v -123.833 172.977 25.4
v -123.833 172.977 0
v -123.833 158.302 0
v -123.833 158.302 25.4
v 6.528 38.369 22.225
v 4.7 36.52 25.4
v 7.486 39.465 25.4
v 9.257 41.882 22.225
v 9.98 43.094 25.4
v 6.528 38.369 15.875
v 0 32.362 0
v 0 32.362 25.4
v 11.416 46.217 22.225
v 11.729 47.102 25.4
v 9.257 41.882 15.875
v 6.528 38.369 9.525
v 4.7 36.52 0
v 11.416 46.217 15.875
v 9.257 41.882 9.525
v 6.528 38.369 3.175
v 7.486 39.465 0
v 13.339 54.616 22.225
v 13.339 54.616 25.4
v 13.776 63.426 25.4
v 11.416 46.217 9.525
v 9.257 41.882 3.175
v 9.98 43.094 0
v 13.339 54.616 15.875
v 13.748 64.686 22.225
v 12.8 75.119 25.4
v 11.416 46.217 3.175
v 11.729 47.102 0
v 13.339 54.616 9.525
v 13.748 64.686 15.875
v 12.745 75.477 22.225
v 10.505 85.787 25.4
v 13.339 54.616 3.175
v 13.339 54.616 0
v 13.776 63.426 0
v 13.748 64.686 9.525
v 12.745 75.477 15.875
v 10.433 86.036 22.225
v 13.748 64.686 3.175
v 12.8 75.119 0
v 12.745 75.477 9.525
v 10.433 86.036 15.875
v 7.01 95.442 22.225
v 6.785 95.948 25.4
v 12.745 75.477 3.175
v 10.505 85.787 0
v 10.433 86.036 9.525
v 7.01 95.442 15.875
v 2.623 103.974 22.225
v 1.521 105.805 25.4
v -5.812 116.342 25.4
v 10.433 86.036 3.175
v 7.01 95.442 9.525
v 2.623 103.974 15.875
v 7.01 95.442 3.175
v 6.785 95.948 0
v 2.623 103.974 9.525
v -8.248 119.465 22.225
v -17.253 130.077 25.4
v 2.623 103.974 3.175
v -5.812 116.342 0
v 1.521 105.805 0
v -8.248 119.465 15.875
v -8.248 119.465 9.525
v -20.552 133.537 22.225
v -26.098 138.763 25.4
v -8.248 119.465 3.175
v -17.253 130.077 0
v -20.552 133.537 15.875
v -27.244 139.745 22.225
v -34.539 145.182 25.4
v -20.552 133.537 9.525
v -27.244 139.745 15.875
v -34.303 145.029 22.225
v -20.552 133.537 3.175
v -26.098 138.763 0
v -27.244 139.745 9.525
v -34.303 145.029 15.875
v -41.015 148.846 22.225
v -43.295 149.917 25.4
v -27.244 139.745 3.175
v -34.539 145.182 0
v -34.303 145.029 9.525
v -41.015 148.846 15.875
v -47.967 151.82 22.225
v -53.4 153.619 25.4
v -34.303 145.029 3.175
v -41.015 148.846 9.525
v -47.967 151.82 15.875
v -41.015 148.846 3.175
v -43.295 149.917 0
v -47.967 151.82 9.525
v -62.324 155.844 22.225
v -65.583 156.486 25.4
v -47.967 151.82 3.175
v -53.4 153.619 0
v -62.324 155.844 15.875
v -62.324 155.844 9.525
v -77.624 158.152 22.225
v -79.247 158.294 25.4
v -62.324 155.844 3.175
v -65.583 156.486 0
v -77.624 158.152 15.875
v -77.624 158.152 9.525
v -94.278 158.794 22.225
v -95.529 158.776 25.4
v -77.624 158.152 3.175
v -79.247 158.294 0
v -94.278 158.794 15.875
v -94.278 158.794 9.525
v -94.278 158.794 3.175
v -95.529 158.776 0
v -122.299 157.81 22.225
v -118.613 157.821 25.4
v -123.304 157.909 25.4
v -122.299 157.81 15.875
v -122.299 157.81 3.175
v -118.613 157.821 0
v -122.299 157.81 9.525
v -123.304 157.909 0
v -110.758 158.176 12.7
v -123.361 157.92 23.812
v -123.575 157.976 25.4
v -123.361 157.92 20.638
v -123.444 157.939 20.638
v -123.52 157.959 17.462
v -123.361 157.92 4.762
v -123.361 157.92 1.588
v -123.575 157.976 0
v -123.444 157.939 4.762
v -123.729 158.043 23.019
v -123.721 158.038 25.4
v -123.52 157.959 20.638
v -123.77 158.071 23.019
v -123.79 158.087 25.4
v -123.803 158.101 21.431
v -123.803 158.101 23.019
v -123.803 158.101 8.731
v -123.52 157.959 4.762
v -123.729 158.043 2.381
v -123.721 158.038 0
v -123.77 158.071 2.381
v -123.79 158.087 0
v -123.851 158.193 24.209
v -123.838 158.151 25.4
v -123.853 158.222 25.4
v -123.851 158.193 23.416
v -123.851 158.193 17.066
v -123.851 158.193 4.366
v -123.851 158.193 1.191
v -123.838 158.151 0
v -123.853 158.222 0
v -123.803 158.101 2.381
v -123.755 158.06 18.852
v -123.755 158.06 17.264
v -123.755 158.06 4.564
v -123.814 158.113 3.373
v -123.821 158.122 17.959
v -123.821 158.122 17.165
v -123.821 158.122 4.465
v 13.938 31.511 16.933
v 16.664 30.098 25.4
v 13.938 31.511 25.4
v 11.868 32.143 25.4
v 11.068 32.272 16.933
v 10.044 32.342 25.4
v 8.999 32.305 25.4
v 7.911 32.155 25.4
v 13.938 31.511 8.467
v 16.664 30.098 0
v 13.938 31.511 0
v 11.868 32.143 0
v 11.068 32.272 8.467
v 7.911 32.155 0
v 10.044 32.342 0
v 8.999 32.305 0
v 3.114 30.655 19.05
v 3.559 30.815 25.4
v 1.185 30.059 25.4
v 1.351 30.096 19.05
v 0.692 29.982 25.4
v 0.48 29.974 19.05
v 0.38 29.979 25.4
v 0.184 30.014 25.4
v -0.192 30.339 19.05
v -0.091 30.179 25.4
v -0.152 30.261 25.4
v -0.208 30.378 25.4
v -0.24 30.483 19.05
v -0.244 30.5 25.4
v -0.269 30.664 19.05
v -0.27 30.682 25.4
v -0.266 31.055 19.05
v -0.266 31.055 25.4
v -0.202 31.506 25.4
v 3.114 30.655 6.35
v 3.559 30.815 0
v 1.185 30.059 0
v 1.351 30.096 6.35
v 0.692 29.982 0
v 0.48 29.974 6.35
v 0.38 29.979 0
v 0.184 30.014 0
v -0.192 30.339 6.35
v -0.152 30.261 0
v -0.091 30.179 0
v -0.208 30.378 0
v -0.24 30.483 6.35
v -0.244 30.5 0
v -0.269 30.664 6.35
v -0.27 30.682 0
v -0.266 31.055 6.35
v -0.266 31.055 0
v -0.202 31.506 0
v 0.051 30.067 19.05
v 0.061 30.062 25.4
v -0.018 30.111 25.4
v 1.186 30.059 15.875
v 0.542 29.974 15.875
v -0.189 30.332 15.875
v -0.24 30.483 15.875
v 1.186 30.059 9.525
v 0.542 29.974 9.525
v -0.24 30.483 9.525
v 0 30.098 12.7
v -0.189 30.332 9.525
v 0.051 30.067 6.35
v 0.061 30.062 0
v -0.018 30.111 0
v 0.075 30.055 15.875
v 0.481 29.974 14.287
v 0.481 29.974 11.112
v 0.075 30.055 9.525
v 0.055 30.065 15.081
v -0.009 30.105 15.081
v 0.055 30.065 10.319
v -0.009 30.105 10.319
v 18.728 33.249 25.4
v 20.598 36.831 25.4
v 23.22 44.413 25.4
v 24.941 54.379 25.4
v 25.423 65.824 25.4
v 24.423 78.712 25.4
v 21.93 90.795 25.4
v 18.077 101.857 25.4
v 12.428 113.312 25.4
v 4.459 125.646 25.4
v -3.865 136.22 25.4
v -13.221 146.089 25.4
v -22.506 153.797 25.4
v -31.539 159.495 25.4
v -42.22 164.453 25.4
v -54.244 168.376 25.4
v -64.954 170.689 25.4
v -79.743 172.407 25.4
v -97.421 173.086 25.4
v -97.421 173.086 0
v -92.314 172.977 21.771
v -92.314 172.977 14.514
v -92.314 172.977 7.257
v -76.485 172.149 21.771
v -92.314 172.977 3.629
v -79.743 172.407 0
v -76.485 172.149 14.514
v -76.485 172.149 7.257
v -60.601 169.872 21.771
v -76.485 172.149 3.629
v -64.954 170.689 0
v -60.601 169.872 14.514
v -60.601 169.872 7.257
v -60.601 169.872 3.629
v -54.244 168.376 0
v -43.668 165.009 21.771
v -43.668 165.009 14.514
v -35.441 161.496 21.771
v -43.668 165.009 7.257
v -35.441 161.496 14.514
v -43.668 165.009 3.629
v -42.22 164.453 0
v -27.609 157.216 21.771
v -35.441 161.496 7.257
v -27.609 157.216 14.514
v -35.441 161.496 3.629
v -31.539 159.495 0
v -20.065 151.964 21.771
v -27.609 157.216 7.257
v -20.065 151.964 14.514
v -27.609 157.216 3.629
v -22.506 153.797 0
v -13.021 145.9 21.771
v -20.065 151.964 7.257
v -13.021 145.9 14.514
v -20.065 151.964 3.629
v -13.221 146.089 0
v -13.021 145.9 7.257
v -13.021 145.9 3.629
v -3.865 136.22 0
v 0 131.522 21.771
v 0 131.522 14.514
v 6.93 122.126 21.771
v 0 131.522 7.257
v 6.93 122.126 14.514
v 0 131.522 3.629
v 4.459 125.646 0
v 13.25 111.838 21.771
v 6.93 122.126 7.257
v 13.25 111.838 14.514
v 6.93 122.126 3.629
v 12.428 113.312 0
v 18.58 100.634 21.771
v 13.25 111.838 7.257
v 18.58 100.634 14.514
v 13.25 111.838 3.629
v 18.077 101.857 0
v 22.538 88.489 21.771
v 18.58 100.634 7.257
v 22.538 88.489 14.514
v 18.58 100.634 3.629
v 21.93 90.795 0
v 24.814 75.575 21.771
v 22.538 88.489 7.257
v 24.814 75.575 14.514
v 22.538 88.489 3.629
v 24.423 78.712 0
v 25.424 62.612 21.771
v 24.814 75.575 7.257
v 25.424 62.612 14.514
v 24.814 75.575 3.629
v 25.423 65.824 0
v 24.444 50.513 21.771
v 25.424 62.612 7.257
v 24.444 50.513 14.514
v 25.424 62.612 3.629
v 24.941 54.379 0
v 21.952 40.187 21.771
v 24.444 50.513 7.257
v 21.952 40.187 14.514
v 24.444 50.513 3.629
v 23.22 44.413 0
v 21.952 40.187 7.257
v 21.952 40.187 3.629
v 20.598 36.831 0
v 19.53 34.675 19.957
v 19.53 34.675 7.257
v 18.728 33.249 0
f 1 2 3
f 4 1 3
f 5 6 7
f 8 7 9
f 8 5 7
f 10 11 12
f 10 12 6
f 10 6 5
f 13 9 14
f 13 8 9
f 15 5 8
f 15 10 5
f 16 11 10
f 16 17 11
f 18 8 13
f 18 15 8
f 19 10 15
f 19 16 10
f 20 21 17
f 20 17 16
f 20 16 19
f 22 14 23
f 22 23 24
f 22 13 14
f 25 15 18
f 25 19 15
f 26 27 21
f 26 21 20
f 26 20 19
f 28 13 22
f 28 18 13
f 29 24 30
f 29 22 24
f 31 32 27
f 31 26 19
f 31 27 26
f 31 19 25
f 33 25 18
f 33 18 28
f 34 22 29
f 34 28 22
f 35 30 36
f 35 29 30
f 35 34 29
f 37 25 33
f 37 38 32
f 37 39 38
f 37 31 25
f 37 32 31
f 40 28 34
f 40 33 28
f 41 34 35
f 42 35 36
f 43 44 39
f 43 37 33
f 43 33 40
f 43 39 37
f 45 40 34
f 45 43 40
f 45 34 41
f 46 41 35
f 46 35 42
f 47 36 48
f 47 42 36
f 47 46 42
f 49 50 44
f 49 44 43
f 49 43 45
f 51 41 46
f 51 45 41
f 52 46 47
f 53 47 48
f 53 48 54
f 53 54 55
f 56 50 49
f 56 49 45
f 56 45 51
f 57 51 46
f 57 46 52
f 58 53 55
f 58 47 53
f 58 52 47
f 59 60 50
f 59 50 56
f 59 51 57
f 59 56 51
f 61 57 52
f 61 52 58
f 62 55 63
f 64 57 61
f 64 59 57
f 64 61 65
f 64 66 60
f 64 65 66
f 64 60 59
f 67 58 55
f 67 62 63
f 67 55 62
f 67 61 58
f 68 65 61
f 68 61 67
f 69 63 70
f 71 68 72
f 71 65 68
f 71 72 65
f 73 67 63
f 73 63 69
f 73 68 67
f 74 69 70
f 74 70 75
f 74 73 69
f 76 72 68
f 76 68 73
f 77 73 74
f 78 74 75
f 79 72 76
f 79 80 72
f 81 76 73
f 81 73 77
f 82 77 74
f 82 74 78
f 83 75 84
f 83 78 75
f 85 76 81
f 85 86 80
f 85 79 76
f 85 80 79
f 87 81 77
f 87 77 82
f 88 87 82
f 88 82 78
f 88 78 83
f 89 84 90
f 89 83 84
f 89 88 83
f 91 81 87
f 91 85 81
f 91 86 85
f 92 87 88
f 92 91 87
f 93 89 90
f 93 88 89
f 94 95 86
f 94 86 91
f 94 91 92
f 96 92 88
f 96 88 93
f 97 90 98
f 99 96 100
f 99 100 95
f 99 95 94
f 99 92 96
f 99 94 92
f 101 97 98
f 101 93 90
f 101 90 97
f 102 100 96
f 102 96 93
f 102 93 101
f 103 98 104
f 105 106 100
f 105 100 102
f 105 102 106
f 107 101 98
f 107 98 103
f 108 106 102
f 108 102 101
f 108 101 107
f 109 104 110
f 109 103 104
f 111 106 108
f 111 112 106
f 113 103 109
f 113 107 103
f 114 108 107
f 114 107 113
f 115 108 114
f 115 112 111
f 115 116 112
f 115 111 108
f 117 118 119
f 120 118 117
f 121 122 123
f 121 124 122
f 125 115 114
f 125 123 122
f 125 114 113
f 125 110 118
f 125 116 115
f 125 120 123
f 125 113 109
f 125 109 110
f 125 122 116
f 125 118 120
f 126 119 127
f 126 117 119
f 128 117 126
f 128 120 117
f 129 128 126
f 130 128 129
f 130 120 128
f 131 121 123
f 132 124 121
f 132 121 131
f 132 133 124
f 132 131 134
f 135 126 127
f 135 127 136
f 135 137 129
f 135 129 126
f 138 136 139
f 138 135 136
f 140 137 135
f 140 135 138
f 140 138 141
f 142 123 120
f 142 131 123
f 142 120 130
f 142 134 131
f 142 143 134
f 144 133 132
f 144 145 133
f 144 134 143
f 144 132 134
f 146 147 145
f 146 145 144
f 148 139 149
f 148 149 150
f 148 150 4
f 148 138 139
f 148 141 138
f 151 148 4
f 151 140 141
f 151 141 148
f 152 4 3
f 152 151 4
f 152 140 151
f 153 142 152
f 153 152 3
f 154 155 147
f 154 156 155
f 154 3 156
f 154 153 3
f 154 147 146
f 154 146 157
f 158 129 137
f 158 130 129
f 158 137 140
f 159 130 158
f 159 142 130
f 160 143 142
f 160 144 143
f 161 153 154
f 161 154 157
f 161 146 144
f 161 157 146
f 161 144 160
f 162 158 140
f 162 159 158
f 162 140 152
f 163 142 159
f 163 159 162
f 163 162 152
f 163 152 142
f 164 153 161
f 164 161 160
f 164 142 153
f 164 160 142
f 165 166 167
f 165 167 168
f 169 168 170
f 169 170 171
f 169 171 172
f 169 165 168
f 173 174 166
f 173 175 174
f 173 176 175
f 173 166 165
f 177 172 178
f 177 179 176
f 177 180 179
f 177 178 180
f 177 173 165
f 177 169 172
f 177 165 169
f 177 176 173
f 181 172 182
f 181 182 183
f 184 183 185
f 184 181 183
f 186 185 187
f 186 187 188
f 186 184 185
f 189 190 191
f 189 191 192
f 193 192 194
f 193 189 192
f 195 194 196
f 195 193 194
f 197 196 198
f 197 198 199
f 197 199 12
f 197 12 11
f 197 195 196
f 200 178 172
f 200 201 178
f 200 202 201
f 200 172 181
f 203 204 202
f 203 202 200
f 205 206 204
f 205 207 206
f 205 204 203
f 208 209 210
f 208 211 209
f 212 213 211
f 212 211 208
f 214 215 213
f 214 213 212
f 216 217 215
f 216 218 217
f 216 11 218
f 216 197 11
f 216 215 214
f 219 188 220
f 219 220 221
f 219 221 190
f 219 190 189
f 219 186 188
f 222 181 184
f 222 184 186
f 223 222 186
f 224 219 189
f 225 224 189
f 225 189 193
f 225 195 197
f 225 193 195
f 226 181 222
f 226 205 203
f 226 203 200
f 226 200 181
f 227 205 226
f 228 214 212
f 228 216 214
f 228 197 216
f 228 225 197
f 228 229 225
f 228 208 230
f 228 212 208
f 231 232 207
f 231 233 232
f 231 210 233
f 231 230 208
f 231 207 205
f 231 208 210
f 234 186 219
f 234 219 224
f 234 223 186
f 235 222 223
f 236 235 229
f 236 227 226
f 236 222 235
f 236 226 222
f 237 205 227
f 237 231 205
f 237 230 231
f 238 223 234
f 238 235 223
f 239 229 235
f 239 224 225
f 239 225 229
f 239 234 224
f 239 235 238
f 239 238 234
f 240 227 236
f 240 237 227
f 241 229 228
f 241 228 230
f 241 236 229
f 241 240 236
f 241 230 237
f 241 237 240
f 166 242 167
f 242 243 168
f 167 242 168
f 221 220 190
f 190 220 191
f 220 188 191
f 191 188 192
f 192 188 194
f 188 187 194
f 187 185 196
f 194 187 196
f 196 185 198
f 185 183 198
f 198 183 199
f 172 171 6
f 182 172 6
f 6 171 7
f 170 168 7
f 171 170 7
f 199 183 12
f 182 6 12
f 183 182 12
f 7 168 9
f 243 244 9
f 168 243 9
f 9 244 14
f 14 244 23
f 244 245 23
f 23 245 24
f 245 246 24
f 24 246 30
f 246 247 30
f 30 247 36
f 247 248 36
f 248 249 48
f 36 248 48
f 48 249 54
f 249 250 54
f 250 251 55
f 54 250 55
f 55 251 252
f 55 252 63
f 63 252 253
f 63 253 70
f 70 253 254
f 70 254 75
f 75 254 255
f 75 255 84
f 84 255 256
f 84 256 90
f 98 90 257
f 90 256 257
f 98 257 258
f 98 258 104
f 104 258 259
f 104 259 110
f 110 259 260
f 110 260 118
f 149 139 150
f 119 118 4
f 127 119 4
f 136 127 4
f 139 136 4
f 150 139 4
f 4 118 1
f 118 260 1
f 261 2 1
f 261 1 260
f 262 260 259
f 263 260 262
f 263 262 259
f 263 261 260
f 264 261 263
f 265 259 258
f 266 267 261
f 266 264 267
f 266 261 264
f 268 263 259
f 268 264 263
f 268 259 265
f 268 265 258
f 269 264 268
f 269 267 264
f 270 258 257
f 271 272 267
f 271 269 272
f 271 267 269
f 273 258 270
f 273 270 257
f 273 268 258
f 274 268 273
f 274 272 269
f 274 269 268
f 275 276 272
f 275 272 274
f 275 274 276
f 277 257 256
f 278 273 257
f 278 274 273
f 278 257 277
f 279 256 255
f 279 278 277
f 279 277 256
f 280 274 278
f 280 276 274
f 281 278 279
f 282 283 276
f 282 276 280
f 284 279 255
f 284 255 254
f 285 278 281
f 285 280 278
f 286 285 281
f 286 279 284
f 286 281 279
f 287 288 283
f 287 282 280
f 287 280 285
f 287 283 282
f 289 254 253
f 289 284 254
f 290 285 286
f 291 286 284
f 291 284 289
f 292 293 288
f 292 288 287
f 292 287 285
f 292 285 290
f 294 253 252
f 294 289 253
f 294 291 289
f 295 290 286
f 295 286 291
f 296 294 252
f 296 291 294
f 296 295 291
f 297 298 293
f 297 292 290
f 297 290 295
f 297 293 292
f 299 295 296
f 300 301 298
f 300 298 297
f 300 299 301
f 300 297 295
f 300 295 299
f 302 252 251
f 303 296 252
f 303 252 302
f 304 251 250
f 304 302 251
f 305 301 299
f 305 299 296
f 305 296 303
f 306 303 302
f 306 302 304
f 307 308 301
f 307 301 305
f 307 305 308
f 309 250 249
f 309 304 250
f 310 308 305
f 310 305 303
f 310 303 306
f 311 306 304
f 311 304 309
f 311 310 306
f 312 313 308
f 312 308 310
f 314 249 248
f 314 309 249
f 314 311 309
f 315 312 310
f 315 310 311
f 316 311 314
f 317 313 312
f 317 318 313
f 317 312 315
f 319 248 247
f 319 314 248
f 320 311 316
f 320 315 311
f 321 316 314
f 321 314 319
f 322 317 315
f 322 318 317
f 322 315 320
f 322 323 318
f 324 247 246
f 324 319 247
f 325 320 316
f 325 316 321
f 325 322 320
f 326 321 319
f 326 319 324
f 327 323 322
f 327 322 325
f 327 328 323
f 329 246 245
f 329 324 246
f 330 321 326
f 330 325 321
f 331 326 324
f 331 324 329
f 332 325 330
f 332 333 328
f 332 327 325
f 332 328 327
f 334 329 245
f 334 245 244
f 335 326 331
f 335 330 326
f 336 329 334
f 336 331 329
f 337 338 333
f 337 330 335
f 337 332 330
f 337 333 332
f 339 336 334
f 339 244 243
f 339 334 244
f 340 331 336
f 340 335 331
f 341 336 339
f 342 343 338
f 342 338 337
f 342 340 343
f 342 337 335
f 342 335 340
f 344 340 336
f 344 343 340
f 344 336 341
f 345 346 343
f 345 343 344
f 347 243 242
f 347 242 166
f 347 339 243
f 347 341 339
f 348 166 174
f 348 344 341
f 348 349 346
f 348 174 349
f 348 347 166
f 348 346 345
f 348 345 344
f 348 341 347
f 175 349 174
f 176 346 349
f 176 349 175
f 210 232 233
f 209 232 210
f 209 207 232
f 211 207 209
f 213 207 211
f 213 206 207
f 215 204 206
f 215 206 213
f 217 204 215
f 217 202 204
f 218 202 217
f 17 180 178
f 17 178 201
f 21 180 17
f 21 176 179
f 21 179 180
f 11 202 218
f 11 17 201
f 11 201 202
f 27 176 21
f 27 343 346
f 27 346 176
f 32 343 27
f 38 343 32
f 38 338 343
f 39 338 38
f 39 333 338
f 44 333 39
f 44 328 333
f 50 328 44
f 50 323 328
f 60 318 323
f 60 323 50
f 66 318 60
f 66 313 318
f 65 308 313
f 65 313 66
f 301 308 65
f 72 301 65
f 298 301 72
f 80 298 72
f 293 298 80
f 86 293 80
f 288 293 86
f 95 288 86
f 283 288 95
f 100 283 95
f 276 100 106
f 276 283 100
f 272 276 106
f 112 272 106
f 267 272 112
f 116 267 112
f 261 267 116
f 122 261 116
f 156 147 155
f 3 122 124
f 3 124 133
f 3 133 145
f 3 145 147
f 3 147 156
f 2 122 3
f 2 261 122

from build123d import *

# Parameters (mm, degrees)
F1_DEPTH = 25.4


with BuildPart() as f1:
    # F0 (on Top) → F1 (new body)
    with BuildSketch(Plane.XY):
        with BuildLine():
            add(Edge.make_bspline(
                [(0, 32.3620848358), (4.616245299, 36.3944720125), (15.4983274834, 44.6984201373), (13.6666682436, 88.8627259497), (-7.097495706, 119.4566531382), (-32.5079925777, 147.3610034027), (-62.5358454037, 156.9909503606), (-91.9306865929, 159.8354501402), (-120.8391481347, 157.3326324801), (-123.9743855546, 157.9896672991), (-123.8329410553, 158.3019942045)],
                knots=[0, 0, 0, 0, 0.1046496121, 0.2605304968, 0.4133735293, 0.5625949593, 0.6979575673, 0.8378718565, 0.9686560343, 1, 1, 1, 1], degree=3))
            add(Edge.make_bspline(
                [(7.9113617539, 32.1550443769), (4.7203534146, 31.5526155318), (-1.0409519817, 28.3342911106), (-0.2116711823, 31.5519841263), (0, 32.3620848358)],
                knots=[0.4072781194, 0.4072781194, 0.4072781194, 0.4072781194, 0.7956278657, 1, 1, 1, 1], degree=3))
            add(Edge.make_bspline(
                [(16.6635511817, 30.0982165935), (16.7030308183, 30.2622075198), (17.0150531463, 32.7150187131), (10.8724841867, 35.4521642858), (8.5677795334, 33.1385749466), (7.9113617539, 32.1550443769)],
                knots=[0.3546609767, 0.3546609767, 0.3546609767, 0.3546609767, 0.3617589695, 0.4623198499, 0.5097820379, 0.5097820379, 0.5097820379, 0.5097820379], degree=3))
            add(Edge.make_bspline(
                [(-123.8329410553, 172.9773198607), (-113.6918879881, 173.1962776362), (-92.015737529, 173.3126790169), (-60.3657998712, 171.4315667112), (-25.7083616084, 159.2218478032), (1.6611720718, 132.14191491), (27.1899010949, 91.1007415152), (26.0918092721, 45.9492515021), (18.6801450725, 32.8924904799), (16.6635511817, 30.0982165935)],
                knots=[0, 0, 0, 0, 0.1342724804, 0.2692810288, 0.4114531234, 0.5583310233, 0.72502551, 0.8912530752, 0.9464123607, 0.9464123607, 0.9464123607, 0.9464123607], degree=3))
            Line((-123.8329410553, 172.9773198607), (-123.8329410553, 158.3019942045))
        make_face()
        with BuildLine():
            add(Edge.make_bspline(
                [(16.6635511817, 30.0982165935), (16.7030308183, 30.2622075198), (17.0150531463, 32.7150187131), (10.8724841867, 35.4521642858), (8.5677795334, 33.1385749466), (7.9113617539, 32.1550443769)],
                knots=[0.3546609767, 0.3546609767, 0.3546609767, 0.3546609767, 0.3617589695, 0.4623198499, 0.5097820379, 0.5097820379, 0.5097820379, 0.5097820379], degree=3))
            add(Edge.make_bspline(
                [(16.6635511817, 30.0982165935), (13.9623635483, 31.7620139941), (11.2579015364, 32.7868359241), (7.9113617539, 32.1550443769)],
                knots=[0, 0, 0, 0, 0.4072781194, 0.4072781194, 0.4072781194, 0.4072781194], degree=3))
        make_face()
    extrude(amount=F1_DEPTH)


solid = f1.part
